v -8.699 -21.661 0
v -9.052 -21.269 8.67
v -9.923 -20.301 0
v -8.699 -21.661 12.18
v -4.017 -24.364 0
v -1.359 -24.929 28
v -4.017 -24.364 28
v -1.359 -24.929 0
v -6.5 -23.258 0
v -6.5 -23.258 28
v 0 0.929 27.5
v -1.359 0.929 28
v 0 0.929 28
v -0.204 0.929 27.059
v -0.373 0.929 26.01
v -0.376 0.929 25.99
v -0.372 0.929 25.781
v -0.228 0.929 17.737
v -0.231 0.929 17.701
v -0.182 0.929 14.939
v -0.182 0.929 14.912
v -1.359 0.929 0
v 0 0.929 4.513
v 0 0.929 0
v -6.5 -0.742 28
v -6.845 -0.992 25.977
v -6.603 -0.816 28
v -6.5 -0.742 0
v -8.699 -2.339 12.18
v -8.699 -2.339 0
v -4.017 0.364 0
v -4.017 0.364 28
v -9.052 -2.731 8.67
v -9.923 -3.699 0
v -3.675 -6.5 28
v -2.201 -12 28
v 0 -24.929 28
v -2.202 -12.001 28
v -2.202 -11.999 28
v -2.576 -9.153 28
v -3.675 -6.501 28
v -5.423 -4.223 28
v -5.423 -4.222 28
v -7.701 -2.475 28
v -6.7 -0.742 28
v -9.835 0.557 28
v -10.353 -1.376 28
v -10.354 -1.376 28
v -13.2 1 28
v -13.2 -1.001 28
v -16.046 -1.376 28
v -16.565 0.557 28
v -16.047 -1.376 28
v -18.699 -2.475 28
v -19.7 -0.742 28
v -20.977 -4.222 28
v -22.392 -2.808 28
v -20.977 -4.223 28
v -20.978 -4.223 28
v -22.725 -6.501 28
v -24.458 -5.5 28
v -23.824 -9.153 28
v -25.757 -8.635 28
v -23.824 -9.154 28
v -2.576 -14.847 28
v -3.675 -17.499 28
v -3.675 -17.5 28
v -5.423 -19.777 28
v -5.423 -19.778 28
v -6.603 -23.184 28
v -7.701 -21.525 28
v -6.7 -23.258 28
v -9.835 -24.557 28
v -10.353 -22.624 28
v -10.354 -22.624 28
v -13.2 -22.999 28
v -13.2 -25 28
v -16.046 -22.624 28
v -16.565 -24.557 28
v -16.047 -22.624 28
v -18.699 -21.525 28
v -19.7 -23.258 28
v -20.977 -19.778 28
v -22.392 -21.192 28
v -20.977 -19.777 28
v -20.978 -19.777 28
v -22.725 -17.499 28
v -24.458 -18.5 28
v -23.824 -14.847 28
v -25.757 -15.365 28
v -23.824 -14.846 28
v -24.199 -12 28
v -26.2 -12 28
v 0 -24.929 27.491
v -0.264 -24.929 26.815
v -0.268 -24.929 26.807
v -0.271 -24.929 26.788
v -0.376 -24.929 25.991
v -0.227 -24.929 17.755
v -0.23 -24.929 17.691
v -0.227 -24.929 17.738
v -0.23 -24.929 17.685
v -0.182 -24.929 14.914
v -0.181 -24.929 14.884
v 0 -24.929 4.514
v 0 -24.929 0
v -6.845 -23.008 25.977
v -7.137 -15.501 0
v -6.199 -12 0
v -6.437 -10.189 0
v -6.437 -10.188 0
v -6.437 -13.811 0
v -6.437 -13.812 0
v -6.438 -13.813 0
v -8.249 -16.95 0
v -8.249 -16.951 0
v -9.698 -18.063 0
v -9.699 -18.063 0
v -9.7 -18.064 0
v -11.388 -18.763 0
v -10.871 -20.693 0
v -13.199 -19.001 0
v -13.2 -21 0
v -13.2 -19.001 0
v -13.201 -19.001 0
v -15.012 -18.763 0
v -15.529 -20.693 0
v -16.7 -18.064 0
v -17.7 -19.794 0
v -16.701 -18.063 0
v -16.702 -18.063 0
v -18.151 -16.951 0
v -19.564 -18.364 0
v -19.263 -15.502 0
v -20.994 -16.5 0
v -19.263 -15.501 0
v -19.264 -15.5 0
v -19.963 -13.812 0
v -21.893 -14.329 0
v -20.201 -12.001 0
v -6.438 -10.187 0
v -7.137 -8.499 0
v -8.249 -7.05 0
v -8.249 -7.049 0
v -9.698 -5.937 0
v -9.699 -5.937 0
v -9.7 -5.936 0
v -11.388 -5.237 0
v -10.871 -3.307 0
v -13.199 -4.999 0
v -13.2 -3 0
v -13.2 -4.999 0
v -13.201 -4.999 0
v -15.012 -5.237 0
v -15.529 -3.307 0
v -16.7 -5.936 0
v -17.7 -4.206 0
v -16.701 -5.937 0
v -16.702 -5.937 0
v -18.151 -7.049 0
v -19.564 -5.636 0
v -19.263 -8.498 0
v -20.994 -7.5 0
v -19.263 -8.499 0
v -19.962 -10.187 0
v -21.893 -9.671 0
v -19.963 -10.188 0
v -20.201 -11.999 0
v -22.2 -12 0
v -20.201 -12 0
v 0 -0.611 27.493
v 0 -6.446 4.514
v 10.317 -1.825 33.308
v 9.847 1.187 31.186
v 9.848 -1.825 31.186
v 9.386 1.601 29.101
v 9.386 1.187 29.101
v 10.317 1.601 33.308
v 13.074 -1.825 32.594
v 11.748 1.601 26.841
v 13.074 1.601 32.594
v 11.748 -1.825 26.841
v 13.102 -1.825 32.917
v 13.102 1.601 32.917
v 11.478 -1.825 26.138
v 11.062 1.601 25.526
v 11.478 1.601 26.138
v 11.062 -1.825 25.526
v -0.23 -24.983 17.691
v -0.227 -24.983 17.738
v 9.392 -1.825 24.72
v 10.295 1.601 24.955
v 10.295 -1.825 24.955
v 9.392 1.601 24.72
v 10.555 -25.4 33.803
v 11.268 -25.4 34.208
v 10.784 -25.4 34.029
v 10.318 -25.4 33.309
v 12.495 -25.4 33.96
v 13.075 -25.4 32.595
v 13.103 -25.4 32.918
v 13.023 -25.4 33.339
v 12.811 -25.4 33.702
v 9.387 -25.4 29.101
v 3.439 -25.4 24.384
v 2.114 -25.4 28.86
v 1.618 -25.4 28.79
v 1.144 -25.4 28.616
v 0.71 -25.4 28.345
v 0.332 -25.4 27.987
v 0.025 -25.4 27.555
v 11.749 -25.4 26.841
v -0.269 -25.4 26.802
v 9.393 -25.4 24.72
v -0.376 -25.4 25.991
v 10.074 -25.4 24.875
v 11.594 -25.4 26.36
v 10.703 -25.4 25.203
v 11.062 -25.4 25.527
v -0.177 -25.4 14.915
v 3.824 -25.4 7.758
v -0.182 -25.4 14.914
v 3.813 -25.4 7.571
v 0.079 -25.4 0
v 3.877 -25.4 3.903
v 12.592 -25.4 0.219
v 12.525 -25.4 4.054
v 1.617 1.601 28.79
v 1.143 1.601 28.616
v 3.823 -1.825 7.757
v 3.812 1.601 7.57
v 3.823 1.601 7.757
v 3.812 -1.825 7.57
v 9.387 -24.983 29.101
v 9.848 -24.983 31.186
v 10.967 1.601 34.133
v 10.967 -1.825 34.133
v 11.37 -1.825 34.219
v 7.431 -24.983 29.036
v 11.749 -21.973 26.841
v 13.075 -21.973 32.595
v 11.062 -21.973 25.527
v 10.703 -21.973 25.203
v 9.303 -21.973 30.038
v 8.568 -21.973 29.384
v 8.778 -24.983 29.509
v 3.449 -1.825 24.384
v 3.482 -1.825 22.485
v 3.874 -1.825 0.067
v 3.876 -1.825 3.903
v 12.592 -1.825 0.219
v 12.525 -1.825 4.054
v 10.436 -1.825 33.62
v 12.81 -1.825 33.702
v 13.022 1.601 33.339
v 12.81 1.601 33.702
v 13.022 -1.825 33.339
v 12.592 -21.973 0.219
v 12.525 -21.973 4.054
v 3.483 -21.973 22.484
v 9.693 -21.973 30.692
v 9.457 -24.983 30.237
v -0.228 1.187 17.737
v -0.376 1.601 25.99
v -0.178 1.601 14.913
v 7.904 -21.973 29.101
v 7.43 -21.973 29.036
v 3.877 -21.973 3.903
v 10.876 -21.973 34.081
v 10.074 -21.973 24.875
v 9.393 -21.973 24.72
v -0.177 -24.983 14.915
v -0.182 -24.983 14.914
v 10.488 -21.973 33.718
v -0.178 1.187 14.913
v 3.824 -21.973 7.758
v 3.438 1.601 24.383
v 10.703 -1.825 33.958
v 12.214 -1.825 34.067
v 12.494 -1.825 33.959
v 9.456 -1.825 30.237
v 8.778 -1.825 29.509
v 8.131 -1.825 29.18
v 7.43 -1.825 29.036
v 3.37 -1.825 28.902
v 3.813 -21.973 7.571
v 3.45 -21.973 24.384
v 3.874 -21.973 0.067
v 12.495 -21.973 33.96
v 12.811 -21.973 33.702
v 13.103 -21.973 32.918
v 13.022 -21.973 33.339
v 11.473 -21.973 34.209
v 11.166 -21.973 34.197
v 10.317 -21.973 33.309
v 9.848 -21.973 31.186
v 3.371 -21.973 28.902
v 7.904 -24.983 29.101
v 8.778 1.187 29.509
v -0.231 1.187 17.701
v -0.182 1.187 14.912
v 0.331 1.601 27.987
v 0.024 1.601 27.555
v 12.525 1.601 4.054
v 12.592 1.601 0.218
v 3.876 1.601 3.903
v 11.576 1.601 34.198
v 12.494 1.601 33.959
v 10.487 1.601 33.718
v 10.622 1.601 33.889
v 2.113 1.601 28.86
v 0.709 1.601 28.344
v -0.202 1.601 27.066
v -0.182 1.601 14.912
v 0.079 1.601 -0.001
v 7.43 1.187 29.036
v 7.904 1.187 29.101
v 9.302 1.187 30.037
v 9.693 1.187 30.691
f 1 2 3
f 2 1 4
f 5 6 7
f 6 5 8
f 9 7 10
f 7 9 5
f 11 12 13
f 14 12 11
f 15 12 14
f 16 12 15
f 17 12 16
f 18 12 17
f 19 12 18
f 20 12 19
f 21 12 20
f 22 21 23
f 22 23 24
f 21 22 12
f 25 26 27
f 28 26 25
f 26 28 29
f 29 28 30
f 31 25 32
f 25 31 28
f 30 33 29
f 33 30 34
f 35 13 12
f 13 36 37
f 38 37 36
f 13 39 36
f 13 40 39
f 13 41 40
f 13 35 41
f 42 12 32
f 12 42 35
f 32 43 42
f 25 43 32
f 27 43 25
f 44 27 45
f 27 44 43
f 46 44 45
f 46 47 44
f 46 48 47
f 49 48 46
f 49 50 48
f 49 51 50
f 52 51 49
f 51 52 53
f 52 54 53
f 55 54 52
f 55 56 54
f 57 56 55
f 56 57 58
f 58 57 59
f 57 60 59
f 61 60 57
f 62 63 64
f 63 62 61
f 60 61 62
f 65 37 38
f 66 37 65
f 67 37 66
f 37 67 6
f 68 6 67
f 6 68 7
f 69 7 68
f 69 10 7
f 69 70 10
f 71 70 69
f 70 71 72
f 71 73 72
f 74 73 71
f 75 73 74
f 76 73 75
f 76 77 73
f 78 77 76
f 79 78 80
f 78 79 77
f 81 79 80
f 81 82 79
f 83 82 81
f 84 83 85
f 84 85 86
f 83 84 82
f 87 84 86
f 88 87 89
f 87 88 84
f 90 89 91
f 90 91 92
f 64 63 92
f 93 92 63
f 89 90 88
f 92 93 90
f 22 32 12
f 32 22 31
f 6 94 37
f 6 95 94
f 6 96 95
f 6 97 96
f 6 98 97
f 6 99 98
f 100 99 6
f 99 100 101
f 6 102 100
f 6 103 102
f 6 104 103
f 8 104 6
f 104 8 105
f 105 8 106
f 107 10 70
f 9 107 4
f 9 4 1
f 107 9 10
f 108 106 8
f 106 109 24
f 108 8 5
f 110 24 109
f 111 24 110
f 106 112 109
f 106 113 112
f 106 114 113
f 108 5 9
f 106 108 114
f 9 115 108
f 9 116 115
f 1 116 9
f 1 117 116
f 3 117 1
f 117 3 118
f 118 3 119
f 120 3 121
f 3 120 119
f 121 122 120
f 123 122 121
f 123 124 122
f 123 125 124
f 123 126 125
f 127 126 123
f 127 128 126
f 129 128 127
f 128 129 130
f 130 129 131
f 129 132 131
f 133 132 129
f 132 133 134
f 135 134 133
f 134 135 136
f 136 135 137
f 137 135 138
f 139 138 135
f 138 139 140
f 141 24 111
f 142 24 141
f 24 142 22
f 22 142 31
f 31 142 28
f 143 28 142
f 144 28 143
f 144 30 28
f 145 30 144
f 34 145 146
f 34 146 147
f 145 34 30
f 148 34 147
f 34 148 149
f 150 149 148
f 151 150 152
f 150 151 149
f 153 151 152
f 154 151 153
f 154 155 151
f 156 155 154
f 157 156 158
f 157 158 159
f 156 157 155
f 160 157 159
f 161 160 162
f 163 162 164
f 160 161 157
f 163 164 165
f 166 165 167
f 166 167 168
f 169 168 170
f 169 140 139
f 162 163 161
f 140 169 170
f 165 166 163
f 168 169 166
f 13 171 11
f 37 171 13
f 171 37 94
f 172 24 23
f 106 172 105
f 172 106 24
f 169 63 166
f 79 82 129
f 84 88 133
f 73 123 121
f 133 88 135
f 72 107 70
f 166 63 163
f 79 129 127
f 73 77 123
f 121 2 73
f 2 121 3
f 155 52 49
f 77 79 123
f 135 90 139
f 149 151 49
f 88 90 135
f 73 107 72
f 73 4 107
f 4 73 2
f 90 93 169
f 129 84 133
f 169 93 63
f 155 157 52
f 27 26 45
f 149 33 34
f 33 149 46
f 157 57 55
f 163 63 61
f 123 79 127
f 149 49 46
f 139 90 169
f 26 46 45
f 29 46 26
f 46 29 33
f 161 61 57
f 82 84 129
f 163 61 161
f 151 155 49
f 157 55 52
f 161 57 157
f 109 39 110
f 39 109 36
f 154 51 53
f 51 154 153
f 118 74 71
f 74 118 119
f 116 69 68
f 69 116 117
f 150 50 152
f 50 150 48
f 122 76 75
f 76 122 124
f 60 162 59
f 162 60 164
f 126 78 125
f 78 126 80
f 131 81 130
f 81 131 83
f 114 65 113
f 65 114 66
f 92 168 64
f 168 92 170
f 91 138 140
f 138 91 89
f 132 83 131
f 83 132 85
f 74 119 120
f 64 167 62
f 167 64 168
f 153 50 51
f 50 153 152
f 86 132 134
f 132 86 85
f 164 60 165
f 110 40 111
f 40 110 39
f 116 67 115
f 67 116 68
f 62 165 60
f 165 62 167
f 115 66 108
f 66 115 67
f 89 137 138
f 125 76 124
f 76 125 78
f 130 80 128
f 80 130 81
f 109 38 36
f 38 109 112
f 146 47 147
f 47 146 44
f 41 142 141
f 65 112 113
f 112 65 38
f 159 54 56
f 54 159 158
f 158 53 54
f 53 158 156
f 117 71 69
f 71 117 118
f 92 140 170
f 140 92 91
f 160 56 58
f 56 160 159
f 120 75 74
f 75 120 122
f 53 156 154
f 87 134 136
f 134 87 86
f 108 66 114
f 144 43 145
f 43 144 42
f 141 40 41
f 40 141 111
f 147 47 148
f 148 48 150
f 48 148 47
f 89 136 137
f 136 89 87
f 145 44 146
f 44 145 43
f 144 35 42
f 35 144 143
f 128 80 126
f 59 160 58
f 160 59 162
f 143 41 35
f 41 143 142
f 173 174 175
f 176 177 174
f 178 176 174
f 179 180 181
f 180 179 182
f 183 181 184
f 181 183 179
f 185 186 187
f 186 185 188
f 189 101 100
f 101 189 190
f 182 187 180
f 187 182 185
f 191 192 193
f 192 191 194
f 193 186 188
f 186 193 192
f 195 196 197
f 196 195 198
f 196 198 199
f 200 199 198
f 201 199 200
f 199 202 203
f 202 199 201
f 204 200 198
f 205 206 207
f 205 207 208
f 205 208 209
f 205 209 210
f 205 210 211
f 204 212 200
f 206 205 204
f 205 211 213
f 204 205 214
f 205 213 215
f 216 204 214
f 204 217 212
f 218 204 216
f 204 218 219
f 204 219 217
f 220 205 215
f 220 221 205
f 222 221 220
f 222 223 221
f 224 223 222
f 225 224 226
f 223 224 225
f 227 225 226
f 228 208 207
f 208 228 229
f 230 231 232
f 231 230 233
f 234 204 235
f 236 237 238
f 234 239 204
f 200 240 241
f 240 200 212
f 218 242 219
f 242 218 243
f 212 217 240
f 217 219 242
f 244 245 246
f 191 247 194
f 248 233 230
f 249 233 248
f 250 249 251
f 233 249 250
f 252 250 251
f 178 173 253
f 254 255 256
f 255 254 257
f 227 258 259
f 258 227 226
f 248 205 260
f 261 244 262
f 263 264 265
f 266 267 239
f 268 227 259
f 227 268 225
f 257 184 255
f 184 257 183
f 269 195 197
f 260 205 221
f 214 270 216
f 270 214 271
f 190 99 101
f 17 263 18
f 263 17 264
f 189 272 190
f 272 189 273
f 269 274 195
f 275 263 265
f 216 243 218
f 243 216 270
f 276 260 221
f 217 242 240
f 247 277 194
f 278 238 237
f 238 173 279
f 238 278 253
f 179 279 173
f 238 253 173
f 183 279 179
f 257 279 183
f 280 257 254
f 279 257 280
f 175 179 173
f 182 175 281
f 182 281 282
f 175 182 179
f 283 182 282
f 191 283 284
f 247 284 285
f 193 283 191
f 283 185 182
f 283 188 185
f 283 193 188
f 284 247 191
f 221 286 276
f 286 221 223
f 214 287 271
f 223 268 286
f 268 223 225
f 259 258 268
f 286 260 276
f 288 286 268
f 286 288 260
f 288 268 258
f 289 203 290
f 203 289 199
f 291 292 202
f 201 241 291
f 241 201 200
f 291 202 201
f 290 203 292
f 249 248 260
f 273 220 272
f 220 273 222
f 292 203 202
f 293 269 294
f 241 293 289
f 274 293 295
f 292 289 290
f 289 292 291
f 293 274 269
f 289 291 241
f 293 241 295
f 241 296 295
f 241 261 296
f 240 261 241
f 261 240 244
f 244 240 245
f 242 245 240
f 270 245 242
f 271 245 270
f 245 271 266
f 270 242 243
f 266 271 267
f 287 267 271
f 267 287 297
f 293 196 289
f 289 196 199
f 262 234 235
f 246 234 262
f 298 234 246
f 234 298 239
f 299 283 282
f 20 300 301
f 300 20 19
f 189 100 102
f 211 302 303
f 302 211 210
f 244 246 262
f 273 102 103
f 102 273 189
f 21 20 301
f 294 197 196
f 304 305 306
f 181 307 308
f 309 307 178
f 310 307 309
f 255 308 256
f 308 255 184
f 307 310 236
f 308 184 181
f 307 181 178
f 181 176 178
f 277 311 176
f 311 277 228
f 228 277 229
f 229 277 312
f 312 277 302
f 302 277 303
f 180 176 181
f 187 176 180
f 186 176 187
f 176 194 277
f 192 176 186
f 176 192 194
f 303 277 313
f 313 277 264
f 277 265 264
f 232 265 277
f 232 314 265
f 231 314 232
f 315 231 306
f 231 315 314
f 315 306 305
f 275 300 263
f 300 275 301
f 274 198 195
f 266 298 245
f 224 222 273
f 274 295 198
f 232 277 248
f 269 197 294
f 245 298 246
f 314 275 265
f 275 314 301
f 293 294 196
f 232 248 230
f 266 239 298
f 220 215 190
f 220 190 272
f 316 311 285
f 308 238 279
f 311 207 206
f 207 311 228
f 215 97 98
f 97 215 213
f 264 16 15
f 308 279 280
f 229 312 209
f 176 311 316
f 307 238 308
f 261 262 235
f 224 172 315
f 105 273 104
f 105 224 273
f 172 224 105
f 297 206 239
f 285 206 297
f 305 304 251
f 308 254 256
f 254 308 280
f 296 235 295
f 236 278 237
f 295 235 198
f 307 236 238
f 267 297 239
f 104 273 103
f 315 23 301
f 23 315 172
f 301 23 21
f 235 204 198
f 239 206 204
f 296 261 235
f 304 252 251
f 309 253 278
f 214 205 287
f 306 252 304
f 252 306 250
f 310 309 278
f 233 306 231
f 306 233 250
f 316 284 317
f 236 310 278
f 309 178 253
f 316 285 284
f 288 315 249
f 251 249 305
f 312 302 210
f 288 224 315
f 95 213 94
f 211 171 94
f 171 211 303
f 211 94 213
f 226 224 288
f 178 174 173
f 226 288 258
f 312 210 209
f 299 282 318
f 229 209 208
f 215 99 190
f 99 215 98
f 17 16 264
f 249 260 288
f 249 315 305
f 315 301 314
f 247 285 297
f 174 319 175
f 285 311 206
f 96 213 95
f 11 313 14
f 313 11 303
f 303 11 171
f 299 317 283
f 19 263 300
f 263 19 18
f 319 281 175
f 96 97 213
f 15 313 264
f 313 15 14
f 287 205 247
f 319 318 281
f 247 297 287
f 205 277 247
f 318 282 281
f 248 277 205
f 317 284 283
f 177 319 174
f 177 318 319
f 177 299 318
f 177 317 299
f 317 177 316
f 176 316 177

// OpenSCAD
// file: ../../../basics/primitives/cone/cone.scad
module cone(height, bottomRadius, topRadius)
{
    cylinder(h=height, r1=bottomRadius, r2=topRadius, $fn=24);
}
// file: ../pegboard-accessories.scad
use <../../basics/primitives/cone/cone.scad>
use <../../external-resources/mounting-hardware/peg-board/blank-panel-mount/pegboard_2_position_blank.scad>

module pegboardAccessories(cordCutout = "No")
{
    union()
    {
        pegboardAccessories_blank();

        pegboardAccessories_cordedToolHolder(cordCutout = cordCutout);
    }
}

module pegboardAccessories_blank()
{
    color("green")
    translate([15.5, 0, 0])
    pegboardBlankPanel();
}

module pegboardAccessories_cordedToolHolder(cordCutout)
{
    height = 28;
    yTranslate = -12;

    difference()
    {
        union()
        {
            pegboardAccessories_cordedToolHolder_mount(height = height, yTranslate = yTranslate);

            pegboardAccessories_cordedToolHolder_holder(height = height, yTranslate = yTranslate);
        }

        pegboardAccessories_cordedToolHolder_holder_cutouts(height = height, yTranslate = yTranslate, cordCutout = cordCutout);
    }
}

module pegboardAccessories_cordedToolHolder_holder(height, yTranslate)
{
    xTranslate = yTranslate + (yTranslate * 0.10);
    translate([xTranslate, yTranslate, 0])
    cone(height = height, bottomRadius = 9, topRadius = 13);
}

module pegboardAccessories_cordedToolHolder_holder_cutouts(height, yTranslate, cordCutout)
{
    xTranslate = yTranslate + (yTranslate * 0.10);
    topRadius = 11;

    translate([xTranslate, yTranslate, -0.01])
    cone(height = height+0.02, bottomRadius = 7, topRadius = topRadius);

    if(cordCutout == "Yes")
    {
        pegboardAccessories_cordedToolHolder_holder_cutouts_cordGap(initialTranslate_x = xTranslate,
                                                                    initialTranslate_y = yTranslate,
                                                                    topRadius = topRadius,
                                                                    yLength = 7);
    }
}

module pegboardAccessories_cordedToolHolder_holder_cutouts_cordGap(initialTranslate_x, initialTranslate_y, topRadius, yLength)
{
    xTranslate = initialTranslate_x - topRadius - 5;
    yTranslate = initialTranslate_y - (yLength / 2.0);

    translate([xTranslate, yTranslate, -0.01])
    cube([10, yLength, 100]);
}

module pegboardAccessories_cordedToolHolder_mount(height, yTranslate)
{
    radius = 13;

    difference()
    {
        translate([0, yTranslate, 0])
        cylinder(r = radius, h = height);

        translate([0, yTranslate*2-5, -0.01])
        cube([radius+0.01, radius*2+10, height+0.02]);
    }
}
// main file
use <../pegboard-accessories.scad>

pegboardAccessories(cordCutout = "No");
